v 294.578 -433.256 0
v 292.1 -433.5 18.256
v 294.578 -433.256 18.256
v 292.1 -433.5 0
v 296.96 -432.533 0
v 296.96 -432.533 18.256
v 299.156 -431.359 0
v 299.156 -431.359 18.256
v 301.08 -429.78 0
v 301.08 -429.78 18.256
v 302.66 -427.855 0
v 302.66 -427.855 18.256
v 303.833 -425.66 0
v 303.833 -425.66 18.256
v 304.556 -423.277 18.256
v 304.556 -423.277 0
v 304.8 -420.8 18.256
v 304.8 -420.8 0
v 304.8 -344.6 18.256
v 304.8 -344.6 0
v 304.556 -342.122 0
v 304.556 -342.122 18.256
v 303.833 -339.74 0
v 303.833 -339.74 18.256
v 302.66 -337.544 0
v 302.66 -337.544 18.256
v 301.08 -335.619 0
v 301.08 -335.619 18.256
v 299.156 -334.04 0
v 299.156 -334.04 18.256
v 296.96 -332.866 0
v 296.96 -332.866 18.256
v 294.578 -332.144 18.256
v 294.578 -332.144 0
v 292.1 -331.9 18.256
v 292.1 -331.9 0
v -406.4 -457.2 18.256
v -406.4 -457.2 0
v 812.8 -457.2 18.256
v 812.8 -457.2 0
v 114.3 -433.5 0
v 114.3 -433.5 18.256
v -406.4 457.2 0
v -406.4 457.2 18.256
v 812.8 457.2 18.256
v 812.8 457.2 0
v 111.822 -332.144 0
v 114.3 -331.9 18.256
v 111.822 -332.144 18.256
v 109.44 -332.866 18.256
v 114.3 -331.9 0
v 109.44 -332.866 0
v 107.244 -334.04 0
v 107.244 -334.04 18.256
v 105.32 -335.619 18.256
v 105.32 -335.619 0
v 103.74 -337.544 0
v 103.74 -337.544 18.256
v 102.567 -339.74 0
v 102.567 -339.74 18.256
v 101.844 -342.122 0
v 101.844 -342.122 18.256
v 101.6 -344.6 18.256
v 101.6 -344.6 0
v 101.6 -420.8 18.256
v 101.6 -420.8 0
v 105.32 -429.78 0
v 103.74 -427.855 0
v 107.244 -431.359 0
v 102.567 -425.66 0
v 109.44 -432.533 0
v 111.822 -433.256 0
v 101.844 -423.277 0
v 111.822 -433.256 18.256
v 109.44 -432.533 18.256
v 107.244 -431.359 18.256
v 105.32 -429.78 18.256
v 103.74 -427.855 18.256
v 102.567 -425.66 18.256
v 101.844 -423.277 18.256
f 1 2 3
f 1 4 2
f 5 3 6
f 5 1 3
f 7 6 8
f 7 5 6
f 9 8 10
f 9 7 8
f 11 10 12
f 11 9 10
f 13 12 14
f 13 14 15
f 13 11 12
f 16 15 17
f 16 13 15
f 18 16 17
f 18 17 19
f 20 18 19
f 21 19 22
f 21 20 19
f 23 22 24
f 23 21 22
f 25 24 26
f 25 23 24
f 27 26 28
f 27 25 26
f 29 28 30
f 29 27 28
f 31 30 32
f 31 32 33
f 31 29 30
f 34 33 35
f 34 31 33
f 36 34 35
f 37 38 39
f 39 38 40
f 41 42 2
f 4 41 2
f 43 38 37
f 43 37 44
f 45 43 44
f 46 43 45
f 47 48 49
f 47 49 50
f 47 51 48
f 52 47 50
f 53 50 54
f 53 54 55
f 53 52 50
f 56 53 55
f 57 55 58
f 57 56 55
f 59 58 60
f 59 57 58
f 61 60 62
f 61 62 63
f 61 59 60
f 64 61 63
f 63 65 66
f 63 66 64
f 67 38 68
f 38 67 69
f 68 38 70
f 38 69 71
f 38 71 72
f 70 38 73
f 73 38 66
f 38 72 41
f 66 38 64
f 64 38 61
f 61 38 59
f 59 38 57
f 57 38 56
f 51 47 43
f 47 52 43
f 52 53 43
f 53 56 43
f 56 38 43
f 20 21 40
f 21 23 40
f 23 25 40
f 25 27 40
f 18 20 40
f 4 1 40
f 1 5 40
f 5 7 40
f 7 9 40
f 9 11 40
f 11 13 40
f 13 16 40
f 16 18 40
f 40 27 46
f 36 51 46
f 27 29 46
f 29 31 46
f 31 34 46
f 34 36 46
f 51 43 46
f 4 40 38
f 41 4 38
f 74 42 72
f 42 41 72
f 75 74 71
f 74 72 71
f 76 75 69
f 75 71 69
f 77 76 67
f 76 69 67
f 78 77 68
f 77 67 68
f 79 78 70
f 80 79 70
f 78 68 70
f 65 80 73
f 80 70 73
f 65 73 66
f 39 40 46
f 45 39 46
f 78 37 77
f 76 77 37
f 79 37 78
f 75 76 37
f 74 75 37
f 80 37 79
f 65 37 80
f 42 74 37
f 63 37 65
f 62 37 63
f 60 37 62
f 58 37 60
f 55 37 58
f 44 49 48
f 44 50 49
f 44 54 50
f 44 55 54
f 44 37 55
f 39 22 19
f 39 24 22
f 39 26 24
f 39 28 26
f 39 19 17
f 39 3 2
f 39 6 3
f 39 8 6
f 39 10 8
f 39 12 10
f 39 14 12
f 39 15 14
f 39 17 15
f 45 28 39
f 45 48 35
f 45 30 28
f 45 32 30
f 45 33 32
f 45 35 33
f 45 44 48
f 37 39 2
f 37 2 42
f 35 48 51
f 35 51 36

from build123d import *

# Parameters (mm, degrees)
SKETCH1_W           = 1219.2
SKETCH1_H           = 914.4
BOSS_EXTRUDE1_DEPTH = 18.25625
SKETCH2_W           = 203.2
SKETCH2_H           = 101.6
CUT_EXTRUDE1_DEPTH  = 933.742714077
FILLET1_R           = 12.7


with BuildPart() as part:
    # Sketch1 → Boss-Extrude1 (new body)
    with BuildSketch(Plane.XY):
        with Locations((203.2, 0)):
            Rectangle(SKETCH1_W, SKETCH1_H)
    extrude(amount=BOSS_EXTRUDE1_DEPTH)

    # Sketch2 → Cut-Extrude1 (cut, through all)
    with BuildSketch(Plane.XY.offset(18.25625)):
        with Locations((203.2, -382.699600817)):
            Rectangle(SKETCH2_W, SKETCH2_H)
    extrude(amount=-CUT_EXTRUDE1_DEPTH, mode=Mode.SUBTRACT)

    # Fillet1
    fillet1_edges = [part.edges().sort_by_distance(p)[0] for p in [
        (101.6, -433.499600817, 9.128125),
        (101.6, -331.899600817, 9.128125),
        (304.8, -331.899600817, 9.128125),
        (304.8, -433.499600817, 9.128125),
    ]]
    fillet(fillet1_edges, radius=FILLET1_R)


solid = part.part
